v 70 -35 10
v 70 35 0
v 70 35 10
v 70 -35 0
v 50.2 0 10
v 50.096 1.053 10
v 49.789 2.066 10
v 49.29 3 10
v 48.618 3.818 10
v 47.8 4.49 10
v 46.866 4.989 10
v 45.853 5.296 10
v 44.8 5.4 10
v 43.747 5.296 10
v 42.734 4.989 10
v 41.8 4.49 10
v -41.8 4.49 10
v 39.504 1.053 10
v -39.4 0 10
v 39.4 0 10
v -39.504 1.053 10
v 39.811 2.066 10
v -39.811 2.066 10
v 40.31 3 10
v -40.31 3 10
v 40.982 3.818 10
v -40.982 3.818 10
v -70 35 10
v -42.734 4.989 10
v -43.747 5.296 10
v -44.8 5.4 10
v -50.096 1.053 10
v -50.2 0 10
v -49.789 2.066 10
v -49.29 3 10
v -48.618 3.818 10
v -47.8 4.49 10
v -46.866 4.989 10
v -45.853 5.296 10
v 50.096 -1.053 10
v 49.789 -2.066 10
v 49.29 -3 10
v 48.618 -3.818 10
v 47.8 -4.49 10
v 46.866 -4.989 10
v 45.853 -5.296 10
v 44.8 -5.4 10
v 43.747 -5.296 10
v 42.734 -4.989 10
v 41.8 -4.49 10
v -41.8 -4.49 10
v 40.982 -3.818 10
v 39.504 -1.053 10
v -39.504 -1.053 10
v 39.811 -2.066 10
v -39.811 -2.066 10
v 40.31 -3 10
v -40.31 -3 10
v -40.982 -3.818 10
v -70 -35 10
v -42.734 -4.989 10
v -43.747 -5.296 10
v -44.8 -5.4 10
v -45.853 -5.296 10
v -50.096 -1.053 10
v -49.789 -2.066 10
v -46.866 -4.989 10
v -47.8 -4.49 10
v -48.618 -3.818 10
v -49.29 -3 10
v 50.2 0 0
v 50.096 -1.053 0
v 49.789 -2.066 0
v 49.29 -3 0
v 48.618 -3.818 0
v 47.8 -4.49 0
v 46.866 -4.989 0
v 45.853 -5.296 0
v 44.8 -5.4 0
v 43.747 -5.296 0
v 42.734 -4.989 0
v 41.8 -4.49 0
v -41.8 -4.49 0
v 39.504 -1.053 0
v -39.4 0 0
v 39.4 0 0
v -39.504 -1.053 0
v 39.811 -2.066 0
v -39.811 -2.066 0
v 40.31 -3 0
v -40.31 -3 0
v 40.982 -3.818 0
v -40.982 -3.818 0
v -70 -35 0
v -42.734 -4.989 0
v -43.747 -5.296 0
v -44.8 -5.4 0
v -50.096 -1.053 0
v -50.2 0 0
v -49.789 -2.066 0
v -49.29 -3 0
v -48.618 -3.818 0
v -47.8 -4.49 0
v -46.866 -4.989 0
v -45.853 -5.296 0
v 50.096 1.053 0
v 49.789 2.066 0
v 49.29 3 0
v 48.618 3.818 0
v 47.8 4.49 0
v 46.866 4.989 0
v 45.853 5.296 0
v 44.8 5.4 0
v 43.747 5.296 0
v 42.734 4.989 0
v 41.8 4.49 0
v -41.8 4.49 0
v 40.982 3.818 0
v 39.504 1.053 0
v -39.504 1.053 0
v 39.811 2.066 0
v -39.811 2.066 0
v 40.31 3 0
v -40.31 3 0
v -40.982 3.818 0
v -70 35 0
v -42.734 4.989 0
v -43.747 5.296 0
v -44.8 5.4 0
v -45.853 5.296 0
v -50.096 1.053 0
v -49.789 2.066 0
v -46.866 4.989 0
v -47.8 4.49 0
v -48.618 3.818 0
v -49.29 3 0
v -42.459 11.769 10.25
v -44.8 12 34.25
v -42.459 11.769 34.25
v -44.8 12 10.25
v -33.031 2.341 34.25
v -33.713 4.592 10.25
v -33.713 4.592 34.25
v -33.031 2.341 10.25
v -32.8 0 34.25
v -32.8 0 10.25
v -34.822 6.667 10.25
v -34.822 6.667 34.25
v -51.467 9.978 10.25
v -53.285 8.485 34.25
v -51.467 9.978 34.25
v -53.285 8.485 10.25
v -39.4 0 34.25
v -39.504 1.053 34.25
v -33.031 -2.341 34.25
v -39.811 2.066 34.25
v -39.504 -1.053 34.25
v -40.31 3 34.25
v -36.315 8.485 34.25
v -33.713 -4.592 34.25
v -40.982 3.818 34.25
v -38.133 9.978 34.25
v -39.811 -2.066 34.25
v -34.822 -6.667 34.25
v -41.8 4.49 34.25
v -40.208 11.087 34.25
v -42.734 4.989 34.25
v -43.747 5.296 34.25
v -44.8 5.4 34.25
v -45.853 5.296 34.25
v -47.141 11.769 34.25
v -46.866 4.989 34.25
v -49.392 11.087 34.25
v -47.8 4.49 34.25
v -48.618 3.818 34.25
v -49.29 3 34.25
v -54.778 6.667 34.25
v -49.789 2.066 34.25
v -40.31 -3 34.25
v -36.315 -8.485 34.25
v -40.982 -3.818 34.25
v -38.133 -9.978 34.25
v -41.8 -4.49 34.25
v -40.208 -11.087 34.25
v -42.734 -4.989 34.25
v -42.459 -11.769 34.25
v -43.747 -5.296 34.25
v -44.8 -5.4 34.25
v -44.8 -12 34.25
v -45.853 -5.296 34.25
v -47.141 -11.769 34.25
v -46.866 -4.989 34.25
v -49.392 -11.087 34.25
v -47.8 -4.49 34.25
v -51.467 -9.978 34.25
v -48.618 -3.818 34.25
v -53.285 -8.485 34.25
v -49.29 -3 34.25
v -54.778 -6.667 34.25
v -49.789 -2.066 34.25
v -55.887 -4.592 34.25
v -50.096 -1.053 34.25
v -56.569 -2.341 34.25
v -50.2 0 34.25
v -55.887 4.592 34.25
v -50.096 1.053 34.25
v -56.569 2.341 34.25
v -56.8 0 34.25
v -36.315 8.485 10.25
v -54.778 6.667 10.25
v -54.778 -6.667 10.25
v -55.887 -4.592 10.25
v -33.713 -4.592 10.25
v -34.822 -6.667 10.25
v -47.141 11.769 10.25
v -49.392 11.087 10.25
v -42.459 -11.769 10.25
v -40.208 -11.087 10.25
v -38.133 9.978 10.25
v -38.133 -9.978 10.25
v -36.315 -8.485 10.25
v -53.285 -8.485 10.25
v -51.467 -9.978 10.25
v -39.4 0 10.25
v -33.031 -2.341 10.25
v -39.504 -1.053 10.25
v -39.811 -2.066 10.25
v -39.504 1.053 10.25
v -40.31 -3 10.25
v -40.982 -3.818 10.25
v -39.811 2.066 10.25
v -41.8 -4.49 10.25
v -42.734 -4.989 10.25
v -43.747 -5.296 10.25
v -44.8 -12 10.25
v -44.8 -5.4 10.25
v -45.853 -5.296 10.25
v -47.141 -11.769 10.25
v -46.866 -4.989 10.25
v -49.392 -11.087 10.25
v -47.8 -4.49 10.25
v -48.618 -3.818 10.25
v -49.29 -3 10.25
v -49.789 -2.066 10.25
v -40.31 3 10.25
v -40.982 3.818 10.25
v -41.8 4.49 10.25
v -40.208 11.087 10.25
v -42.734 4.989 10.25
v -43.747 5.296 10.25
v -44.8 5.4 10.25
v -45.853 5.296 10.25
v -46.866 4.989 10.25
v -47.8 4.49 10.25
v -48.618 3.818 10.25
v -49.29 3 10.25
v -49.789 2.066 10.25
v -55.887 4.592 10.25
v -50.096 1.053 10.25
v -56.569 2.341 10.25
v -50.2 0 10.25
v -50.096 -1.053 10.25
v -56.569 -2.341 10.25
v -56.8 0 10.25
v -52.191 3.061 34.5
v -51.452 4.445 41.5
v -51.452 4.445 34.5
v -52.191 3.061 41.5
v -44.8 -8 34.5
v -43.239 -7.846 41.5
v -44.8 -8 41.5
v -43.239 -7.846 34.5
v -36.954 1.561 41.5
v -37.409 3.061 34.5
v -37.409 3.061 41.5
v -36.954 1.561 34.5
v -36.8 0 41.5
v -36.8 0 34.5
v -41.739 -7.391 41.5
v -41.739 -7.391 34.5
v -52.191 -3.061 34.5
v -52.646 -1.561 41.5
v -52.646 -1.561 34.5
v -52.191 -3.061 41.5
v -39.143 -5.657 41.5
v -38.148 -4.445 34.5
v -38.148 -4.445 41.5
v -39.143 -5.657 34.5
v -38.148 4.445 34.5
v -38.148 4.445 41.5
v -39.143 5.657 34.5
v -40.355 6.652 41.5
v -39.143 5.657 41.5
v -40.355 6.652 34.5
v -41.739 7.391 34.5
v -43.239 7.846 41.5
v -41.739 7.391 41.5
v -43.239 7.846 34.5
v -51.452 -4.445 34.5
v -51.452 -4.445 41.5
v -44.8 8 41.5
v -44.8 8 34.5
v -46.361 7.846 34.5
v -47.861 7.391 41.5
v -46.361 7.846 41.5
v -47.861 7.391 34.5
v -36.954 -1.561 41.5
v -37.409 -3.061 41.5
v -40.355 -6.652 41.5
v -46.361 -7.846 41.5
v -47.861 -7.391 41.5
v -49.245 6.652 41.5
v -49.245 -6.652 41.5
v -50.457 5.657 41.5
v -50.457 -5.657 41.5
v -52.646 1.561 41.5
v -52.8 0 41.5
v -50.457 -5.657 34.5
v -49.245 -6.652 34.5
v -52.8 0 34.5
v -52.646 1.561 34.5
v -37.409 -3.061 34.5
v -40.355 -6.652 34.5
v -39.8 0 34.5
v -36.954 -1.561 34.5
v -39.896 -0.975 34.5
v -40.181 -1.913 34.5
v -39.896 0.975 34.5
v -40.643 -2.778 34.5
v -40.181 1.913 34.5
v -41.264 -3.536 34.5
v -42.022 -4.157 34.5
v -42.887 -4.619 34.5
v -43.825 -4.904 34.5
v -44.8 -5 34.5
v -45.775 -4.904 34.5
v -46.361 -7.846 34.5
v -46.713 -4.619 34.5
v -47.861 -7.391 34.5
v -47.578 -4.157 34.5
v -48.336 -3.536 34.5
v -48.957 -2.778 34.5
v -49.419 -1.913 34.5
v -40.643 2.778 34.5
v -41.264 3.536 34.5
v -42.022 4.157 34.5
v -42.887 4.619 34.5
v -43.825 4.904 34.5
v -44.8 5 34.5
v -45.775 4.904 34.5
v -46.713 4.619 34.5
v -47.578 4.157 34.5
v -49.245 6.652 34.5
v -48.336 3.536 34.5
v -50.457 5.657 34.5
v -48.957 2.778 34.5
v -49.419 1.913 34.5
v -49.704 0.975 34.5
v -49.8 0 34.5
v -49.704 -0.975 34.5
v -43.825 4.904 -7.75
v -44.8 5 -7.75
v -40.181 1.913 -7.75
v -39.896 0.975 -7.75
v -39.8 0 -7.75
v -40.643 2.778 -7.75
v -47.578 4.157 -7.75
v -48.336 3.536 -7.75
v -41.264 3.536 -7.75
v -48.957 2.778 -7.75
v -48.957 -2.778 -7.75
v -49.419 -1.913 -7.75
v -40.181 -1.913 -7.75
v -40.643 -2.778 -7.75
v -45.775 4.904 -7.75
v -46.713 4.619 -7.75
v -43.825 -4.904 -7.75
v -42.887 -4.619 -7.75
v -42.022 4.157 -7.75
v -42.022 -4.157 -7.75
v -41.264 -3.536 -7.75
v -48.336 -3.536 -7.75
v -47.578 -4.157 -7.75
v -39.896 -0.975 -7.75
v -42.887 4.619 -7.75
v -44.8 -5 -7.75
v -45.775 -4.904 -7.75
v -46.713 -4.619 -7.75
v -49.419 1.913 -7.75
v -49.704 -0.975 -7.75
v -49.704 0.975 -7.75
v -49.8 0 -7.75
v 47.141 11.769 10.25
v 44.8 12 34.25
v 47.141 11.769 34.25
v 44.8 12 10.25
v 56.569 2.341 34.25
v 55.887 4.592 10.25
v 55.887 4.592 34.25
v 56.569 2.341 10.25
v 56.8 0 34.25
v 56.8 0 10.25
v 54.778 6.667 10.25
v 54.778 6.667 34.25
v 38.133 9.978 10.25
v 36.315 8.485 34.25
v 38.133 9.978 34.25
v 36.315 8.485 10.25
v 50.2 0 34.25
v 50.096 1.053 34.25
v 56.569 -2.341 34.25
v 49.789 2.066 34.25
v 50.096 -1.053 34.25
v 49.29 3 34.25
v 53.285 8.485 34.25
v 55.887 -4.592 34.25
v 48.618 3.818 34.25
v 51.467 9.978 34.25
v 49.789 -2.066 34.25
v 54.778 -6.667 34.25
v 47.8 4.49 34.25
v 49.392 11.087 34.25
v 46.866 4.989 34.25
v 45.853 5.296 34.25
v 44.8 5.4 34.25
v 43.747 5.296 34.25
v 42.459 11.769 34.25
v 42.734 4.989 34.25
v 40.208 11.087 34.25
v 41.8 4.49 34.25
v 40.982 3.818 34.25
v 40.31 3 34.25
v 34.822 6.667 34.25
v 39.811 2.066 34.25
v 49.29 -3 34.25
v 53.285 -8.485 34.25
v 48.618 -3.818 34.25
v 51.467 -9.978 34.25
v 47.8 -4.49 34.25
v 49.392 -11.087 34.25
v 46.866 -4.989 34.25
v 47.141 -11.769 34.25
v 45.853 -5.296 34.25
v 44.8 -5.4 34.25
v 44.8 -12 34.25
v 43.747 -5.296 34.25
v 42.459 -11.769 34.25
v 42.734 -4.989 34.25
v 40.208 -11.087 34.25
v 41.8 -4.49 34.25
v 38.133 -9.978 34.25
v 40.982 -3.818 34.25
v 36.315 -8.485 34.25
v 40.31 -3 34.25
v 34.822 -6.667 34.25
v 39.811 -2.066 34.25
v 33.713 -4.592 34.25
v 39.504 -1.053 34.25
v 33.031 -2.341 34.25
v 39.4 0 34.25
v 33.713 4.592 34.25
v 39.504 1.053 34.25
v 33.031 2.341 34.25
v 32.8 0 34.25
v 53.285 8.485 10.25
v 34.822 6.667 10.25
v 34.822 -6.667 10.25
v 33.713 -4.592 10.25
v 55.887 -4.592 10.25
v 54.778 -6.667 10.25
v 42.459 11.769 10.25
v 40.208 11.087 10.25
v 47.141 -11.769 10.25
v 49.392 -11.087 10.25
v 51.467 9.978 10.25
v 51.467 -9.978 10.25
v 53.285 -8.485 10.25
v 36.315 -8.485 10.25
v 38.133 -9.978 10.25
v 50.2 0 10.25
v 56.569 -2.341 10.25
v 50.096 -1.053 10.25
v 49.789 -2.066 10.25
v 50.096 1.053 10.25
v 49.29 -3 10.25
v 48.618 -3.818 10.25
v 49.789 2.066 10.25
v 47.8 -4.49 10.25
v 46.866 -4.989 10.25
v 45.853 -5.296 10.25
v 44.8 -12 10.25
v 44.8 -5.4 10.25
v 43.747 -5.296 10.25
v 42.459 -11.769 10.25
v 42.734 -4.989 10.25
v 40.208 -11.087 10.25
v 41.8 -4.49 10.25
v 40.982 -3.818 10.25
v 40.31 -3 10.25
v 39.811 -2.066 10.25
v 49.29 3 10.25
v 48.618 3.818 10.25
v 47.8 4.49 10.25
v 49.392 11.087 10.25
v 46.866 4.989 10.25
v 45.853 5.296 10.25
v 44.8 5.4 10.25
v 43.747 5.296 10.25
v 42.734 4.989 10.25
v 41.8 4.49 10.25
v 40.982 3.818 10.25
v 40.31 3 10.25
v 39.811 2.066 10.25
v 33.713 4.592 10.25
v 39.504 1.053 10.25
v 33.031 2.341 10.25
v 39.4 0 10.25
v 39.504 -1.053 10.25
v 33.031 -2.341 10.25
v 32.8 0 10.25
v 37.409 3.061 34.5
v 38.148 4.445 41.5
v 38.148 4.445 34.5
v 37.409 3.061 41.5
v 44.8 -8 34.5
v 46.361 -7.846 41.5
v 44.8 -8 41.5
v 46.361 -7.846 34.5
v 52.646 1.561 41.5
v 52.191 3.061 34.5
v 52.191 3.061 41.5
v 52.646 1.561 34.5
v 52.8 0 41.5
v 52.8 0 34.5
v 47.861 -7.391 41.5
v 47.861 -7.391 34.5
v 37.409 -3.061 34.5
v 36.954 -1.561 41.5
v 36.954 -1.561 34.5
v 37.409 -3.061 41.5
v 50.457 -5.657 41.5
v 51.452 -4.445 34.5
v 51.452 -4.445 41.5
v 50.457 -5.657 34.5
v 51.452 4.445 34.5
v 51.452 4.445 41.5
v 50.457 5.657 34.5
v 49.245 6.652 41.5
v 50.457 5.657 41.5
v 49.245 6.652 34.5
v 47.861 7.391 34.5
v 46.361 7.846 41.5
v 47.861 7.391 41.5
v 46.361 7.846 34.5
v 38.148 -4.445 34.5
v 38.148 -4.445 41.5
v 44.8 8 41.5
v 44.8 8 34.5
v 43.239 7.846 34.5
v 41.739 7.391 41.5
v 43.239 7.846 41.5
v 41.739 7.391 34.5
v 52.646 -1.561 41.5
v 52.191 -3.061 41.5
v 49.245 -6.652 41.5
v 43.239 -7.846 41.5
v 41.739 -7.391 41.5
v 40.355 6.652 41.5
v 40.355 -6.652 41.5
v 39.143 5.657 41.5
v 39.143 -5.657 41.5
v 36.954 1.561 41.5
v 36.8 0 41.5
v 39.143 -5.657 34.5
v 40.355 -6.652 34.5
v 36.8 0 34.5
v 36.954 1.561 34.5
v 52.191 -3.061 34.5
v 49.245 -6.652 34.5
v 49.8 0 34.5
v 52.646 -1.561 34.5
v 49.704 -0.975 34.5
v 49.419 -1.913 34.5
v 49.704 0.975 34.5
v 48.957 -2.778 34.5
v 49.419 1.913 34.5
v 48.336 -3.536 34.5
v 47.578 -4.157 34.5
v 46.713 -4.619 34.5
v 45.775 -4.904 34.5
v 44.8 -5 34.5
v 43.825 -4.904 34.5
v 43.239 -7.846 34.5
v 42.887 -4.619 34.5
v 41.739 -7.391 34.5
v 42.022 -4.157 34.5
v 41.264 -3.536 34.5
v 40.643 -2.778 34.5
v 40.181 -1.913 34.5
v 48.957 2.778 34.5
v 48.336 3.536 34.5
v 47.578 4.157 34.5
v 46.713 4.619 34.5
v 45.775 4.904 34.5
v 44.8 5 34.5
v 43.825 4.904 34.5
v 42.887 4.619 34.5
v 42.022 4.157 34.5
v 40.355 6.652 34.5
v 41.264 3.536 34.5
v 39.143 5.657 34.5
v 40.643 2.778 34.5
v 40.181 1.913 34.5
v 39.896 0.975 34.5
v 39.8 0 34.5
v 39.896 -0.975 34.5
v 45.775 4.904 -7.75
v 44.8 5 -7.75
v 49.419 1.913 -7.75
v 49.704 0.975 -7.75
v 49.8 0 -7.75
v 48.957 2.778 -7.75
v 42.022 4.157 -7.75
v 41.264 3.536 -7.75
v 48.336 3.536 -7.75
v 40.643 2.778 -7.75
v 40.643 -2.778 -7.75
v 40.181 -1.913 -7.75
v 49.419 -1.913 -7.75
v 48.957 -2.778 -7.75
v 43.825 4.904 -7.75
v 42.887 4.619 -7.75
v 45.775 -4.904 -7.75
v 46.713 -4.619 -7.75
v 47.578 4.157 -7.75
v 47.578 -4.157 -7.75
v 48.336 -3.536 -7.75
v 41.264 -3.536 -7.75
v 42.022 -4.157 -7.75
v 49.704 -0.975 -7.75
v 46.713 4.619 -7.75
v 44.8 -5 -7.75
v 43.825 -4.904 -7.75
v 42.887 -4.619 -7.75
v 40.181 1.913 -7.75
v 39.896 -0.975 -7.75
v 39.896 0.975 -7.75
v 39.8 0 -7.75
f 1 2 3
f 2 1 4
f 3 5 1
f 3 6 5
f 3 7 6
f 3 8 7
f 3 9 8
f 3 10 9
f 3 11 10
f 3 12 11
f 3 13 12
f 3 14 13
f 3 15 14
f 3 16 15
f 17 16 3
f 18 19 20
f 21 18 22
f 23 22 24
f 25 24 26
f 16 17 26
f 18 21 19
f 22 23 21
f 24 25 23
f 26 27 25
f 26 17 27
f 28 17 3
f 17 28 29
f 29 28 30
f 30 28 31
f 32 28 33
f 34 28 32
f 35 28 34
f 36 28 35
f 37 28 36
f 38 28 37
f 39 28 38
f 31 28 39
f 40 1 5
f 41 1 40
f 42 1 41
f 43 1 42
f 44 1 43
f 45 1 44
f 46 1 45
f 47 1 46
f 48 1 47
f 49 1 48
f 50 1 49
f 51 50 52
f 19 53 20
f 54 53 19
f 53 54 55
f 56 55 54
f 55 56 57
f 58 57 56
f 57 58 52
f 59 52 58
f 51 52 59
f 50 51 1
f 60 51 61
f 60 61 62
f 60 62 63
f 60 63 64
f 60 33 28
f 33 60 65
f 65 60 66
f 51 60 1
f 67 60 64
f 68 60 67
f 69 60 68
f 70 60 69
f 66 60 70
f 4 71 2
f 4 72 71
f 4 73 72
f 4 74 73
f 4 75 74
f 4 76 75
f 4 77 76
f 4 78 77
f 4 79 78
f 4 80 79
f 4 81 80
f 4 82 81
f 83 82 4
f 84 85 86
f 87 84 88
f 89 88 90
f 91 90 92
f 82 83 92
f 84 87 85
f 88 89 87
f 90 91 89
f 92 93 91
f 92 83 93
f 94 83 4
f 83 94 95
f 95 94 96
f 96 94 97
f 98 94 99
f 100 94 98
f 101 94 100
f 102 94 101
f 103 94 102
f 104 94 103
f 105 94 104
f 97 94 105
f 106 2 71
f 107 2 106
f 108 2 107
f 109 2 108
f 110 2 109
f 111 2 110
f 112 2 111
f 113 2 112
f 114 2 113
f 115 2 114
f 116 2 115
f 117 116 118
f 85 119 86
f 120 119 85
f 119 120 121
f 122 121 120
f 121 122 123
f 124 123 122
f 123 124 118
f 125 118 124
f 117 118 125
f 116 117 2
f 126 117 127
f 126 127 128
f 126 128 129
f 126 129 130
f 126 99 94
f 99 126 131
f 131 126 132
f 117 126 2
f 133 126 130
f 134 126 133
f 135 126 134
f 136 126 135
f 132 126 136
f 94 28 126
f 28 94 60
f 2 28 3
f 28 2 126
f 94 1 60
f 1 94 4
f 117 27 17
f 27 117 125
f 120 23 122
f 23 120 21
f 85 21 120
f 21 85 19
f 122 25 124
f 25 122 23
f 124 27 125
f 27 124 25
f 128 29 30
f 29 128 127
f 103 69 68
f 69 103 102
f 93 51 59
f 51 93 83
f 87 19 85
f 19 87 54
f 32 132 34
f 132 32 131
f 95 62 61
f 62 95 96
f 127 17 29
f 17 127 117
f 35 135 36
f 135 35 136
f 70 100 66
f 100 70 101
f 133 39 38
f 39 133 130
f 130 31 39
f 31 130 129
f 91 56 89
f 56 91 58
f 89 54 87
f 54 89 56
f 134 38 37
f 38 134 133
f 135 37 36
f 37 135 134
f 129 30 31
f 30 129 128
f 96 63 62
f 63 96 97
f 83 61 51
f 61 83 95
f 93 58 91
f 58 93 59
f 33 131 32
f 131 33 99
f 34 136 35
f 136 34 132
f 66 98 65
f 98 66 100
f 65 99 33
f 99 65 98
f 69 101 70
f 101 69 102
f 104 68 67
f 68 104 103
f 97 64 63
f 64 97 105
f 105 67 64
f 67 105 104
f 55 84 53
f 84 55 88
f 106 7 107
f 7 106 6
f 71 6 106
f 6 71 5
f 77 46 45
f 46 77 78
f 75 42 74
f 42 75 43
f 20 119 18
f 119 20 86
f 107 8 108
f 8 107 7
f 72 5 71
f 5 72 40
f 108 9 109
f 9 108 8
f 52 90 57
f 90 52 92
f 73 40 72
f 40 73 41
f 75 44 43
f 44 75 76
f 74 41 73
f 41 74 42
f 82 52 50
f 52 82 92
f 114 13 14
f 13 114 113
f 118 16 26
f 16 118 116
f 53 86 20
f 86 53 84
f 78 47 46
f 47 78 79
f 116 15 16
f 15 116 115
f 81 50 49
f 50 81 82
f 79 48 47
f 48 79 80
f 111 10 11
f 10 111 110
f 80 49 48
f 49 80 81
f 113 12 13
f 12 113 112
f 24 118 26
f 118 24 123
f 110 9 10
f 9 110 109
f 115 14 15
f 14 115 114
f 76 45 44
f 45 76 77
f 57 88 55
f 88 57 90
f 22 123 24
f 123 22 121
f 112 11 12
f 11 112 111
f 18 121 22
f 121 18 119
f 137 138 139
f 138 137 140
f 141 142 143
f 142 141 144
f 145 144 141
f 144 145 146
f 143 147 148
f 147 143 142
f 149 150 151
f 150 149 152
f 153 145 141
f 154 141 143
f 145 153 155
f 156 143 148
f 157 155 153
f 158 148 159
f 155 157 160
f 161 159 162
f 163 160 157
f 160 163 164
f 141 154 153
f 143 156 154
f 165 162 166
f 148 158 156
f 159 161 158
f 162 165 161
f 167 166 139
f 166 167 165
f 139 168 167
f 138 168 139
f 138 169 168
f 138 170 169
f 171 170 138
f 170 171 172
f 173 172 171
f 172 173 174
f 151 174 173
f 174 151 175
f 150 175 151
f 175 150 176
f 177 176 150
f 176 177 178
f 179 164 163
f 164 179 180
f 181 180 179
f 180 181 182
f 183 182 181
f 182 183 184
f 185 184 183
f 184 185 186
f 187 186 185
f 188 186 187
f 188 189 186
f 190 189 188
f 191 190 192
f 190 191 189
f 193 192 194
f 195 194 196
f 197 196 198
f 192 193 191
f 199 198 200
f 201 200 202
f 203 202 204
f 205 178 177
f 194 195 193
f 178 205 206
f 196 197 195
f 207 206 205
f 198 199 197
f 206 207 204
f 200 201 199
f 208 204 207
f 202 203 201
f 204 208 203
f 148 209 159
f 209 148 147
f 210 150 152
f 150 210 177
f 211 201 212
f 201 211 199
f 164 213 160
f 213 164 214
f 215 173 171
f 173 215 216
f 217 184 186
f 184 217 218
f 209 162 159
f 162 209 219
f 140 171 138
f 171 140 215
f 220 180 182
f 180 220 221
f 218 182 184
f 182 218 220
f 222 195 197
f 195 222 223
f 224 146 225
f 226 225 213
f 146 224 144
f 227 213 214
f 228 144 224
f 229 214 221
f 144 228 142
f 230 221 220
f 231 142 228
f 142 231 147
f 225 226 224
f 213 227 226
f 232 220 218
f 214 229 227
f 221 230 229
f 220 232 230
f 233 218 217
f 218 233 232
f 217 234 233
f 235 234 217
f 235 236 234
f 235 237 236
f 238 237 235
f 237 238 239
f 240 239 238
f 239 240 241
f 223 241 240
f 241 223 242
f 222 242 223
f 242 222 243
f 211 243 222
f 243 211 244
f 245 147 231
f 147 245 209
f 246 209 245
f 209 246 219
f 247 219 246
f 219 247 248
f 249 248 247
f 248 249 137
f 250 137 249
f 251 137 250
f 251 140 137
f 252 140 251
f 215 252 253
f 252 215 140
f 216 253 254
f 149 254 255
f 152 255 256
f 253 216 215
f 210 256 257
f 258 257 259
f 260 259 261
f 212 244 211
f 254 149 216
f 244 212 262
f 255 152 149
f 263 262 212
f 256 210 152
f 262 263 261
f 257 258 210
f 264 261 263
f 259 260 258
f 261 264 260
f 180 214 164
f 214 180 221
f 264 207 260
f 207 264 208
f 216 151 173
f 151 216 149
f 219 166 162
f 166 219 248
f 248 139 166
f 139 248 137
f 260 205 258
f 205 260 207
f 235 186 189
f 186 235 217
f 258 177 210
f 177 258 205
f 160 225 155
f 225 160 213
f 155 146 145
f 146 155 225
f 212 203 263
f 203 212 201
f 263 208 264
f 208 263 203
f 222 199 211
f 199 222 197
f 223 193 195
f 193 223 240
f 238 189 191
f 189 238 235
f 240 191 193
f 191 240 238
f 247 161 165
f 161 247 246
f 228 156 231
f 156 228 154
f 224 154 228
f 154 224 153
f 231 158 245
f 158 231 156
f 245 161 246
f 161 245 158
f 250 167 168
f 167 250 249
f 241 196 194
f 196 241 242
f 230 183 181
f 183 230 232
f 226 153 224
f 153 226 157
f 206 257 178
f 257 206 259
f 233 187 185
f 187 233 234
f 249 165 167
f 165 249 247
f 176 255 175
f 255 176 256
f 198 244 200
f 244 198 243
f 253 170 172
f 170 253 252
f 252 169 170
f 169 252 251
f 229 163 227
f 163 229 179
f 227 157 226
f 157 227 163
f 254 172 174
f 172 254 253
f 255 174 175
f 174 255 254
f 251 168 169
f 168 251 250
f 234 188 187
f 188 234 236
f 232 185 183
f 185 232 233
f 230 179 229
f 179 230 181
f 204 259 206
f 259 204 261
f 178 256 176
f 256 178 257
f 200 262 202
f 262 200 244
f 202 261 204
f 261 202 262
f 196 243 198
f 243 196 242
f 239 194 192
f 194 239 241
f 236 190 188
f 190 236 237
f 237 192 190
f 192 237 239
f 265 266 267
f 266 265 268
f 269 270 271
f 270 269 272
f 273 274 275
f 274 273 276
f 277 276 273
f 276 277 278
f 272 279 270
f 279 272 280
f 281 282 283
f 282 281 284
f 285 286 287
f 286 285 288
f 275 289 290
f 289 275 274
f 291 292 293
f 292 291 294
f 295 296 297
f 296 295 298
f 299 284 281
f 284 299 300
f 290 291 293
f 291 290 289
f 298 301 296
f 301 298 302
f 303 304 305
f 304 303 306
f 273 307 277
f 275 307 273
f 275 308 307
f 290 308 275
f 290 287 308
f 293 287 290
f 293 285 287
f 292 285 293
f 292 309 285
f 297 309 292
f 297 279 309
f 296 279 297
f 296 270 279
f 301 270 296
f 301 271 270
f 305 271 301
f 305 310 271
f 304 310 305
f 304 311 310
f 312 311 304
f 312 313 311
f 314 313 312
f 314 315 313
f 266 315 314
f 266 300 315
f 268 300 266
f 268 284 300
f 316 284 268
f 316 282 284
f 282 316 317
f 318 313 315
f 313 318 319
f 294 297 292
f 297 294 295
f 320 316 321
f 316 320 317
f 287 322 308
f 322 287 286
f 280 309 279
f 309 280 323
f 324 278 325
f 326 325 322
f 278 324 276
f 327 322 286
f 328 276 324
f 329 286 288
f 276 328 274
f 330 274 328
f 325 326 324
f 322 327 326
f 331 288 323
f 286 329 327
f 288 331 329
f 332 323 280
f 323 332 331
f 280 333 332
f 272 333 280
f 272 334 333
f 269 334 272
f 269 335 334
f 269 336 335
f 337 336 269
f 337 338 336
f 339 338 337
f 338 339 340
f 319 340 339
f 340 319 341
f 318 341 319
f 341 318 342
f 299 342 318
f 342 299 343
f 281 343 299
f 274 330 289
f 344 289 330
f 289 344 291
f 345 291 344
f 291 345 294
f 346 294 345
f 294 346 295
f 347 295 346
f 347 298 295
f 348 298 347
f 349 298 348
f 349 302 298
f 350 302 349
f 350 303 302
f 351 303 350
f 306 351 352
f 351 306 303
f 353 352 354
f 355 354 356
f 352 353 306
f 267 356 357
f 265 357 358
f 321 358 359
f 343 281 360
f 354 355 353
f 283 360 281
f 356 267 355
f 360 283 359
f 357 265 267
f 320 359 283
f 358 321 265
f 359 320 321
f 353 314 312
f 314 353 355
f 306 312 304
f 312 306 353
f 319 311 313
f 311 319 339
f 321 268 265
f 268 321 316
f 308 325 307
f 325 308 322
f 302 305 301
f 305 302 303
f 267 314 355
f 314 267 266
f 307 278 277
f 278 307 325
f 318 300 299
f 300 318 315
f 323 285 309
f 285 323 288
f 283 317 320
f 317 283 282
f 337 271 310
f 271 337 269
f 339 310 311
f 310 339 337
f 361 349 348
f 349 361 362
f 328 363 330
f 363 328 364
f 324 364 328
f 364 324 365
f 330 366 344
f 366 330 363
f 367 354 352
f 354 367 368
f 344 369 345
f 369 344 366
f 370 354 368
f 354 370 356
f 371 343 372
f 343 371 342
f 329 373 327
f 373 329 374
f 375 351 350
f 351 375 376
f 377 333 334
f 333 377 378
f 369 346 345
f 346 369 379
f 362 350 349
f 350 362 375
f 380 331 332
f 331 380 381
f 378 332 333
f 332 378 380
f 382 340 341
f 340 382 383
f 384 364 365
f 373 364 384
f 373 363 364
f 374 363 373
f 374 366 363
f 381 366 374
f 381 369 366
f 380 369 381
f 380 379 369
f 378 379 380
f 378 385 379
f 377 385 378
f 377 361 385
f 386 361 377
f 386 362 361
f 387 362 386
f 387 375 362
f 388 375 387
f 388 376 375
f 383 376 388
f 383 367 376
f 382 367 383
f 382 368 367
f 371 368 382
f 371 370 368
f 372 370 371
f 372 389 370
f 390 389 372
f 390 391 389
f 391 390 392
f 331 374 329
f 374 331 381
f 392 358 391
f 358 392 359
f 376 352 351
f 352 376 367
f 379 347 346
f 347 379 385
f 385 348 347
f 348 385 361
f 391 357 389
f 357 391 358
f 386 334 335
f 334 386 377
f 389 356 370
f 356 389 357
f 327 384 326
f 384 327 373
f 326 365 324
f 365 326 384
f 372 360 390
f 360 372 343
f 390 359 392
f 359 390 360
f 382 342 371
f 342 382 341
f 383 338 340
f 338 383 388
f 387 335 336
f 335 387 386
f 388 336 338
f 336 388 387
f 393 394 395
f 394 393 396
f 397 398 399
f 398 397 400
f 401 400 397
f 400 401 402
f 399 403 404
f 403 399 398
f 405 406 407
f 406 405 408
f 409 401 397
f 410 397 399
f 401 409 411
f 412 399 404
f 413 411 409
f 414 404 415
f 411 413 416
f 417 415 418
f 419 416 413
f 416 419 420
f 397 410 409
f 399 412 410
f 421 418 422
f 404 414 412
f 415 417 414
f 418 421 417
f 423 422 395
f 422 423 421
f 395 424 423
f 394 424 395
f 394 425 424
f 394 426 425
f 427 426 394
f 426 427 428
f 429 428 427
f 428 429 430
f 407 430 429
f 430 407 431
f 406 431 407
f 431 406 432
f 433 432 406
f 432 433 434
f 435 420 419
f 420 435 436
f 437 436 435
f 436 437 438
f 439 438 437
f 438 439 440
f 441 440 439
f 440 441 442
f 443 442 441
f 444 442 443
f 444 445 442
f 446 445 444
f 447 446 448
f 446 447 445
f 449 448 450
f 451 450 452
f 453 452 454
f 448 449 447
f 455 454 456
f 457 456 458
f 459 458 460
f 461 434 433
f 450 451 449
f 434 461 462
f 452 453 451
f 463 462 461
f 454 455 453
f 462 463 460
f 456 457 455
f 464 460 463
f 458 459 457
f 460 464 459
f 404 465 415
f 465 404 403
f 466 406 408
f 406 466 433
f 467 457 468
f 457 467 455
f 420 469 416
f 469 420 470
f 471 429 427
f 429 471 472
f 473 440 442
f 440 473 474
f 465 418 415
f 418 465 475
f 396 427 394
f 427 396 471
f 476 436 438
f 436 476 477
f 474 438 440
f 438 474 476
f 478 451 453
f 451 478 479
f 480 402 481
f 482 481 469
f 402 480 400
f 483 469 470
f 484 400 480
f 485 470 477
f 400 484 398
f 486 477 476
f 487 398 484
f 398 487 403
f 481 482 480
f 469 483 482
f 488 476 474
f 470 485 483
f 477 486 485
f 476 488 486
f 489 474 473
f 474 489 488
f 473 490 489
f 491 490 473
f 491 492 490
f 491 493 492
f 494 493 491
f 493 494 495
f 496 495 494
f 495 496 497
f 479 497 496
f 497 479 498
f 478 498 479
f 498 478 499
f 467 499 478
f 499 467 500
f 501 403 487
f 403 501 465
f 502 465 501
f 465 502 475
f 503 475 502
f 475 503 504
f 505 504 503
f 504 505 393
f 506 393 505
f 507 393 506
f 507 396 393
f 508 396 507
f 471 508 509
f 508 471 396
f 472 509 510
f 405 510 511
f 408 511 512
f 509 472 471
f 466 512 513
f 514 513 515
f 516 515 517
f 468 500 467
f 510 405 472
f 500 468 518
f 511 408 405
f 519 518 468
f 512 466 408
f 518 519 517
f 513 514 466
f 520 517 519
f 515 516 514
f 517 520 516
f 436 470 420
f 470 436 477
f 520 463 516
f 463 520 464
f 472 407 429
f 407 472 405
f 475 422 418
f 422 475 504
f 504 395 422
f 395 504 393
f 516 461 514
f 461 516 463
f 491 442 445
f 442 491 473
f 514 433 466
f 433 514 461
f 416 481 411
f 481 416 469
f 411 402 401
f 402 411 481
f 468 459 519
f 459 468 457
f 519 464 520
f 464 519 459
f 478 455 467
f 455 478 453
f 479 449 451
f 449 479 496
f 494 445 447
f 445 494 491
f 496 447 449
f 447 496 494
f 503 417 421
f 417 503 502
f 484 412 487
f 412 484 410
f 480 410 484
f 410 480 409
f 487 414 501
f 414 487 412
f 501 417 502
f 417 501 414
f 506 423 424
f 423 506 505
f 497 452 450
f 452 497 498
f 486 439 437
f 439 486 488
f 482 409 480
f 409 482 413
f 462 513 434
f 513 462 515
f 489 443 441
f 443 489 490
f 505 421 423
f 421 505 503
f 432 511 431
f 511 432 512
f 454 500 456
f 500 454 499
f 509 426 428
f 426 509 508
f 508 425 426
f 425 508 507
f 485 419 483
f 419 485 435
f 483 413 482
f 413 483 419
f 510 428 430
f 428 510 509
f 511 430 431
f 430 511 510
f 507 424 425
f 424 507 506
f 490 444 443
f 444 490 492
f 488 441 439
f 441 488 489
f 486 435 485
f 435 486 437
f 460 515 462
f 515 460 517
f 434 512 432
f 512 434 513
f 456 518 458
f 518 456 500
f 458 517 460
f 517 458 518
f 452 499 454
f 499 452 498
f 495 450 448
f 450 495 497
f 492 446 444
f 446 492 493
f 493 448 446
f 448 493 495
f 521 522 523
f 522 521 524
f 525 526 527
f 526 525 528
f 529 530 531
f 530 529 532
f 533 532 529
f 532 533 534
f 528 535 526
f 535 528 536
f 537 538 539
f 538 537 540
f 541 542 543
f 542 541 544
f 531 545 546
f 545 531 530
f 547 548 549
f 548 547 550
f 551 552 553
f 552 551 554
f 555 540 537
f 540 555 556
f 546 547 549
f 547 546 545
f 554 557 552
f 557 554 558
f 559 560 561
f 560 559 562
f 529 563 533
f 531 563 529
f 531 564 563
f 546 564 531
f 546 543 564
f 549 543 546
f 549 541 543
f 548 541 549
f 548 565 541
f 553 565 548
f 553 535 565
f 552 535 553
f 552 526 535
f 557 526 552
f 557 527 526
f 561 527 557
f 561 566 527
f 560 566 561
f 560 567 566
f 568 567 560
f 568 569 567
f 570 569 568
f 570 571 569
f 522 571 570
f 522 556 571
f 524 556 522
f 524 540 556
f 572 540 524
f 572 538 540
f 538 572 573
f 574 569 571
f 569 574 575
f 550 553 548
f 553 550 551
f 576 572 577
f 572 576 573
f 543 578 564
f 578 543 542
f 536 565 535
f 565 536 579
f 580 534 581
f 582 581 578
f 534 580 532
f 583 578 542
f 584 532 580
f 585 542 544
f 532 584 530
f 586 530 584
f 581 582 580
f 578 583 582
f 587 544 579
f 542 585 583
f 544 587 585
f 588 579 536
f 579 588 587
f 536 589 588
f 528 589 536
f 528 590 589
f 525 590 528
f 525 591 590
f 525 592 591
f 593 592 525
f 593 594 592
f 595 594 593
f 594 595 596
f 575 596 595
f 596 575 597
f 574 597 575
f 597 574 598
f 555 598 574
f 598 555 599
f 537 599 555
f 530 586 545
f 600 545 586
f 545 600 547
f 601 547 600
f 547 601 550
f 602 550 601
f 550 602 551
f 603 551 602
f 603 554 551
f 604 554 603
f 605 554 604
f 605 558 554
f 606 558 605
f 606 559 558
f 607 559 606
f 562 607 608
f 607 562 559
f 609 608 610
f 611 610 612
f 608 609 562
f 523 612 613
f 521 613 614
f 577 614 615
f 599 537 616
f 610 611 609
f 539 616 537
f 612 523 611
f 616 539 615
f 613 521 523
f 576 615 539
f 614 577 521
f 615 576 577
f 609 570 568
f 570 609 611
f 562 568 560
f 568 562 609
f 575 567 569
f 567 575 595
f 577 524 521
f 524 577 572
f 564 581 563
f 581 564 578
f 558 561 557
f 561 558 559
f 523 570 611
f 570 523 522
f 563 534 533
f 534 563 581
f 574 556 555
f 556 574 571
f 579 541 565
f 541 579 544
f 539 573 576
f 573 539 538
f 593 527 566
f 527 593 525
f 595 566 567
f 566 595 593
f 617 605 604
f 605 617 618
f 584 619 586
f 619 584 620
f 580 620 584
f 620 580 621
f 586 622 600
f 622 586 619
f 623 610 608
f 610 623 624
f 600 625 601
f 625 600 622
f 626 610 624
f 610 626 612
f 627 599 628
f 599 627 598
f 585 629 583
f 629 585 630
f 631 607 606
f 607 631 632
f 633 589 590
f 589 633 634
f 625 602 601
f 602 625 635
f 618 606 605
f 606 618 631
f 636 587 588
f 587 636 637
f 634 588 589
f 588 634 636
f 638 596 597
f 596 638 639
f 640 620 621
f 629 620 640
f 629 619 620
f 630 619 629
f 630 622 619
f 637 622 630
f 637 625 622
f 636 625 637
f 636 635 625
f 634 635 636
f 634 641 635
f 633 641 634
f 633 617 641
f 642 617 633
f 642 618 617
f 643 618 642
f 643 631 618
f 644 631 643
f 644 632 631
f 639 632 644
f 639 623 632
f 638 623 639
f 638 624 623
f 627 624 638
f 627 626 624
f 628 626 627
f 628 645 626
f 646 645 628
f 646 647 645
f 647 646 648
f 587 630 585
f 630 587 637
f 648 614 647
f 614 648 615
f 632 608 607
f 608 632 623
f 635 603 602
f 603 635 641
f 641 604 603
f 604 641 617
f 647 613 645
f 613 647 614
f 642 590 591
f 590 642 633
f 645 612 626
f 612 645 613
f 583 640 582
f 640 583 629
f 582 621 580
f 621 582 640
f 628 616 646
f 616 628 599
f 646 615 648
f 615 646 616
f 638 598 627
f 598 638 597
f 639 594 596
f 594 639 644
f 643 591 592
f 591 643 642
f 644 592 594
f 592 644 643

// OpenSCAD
$fn = 32;

// ------------------------------------------------------------------------
// Standoff columns: 2 d24 standoffs, bolts d10
// Every part is its own module, assembly() places them once.
// ------------------------------------------------------------------------

// --- part 1 ---
module base_plate() {
  difference() {
    translate([-70, -35, 0]) cube([140, 70, 10]);
    translate([-44.8, 0, -1]) cylinder(h = 12, d = 10.8);
    translate([44.8, 0, -1]) cylinder(h = 12, d = 10.8);
  }
}

// --- part 2 ---
module spacer1() {
  difference() {
      translate([0, 0, 0]) cylinder(h = 24, d = 24);
      translate([0, 0, -1]) cylinder(h = 26, d = 10.8);
    }
}

// --- part 3 ---
module bolt1() {
  cylinder(h = 7, d = 16);
  translate([0, 0, -42.25]) cylinder(h = 42.25, d = 10);
}

// --- part 4 ---
module spacer2() {
  difference() {
      translate([0, 0, 0]) cylinder(h = 24, d = 24);
      translate([0, 0, -1]) cylinder(h = 26, d = 10.8);
    }
}

// --- part 5 ---
module bolt2() {
  cylinder(h = 7, d = 16);
  translate([0, 0, -42.25]) cylinder(h = 42.25, d = 10);
}

// --- assembly ---
module assembly() {
  translate([0, 0, 0]) rotate([0, 0, 0]) base_plate();
  translate([-44.8, 0, 10.25]) rotate([0, 0, 0]) spacer1();
  translate([-44.8, 0, 34.5]) rotate([0, 0, 0]) bolt1();
  translate([44.8, 0, 10.25]) rotate([0, 0, 0]) spacer2();
  translate([44.8, 0, 34.5]) rotate([0, 0, 0]) bolt2();
}

assembly();
